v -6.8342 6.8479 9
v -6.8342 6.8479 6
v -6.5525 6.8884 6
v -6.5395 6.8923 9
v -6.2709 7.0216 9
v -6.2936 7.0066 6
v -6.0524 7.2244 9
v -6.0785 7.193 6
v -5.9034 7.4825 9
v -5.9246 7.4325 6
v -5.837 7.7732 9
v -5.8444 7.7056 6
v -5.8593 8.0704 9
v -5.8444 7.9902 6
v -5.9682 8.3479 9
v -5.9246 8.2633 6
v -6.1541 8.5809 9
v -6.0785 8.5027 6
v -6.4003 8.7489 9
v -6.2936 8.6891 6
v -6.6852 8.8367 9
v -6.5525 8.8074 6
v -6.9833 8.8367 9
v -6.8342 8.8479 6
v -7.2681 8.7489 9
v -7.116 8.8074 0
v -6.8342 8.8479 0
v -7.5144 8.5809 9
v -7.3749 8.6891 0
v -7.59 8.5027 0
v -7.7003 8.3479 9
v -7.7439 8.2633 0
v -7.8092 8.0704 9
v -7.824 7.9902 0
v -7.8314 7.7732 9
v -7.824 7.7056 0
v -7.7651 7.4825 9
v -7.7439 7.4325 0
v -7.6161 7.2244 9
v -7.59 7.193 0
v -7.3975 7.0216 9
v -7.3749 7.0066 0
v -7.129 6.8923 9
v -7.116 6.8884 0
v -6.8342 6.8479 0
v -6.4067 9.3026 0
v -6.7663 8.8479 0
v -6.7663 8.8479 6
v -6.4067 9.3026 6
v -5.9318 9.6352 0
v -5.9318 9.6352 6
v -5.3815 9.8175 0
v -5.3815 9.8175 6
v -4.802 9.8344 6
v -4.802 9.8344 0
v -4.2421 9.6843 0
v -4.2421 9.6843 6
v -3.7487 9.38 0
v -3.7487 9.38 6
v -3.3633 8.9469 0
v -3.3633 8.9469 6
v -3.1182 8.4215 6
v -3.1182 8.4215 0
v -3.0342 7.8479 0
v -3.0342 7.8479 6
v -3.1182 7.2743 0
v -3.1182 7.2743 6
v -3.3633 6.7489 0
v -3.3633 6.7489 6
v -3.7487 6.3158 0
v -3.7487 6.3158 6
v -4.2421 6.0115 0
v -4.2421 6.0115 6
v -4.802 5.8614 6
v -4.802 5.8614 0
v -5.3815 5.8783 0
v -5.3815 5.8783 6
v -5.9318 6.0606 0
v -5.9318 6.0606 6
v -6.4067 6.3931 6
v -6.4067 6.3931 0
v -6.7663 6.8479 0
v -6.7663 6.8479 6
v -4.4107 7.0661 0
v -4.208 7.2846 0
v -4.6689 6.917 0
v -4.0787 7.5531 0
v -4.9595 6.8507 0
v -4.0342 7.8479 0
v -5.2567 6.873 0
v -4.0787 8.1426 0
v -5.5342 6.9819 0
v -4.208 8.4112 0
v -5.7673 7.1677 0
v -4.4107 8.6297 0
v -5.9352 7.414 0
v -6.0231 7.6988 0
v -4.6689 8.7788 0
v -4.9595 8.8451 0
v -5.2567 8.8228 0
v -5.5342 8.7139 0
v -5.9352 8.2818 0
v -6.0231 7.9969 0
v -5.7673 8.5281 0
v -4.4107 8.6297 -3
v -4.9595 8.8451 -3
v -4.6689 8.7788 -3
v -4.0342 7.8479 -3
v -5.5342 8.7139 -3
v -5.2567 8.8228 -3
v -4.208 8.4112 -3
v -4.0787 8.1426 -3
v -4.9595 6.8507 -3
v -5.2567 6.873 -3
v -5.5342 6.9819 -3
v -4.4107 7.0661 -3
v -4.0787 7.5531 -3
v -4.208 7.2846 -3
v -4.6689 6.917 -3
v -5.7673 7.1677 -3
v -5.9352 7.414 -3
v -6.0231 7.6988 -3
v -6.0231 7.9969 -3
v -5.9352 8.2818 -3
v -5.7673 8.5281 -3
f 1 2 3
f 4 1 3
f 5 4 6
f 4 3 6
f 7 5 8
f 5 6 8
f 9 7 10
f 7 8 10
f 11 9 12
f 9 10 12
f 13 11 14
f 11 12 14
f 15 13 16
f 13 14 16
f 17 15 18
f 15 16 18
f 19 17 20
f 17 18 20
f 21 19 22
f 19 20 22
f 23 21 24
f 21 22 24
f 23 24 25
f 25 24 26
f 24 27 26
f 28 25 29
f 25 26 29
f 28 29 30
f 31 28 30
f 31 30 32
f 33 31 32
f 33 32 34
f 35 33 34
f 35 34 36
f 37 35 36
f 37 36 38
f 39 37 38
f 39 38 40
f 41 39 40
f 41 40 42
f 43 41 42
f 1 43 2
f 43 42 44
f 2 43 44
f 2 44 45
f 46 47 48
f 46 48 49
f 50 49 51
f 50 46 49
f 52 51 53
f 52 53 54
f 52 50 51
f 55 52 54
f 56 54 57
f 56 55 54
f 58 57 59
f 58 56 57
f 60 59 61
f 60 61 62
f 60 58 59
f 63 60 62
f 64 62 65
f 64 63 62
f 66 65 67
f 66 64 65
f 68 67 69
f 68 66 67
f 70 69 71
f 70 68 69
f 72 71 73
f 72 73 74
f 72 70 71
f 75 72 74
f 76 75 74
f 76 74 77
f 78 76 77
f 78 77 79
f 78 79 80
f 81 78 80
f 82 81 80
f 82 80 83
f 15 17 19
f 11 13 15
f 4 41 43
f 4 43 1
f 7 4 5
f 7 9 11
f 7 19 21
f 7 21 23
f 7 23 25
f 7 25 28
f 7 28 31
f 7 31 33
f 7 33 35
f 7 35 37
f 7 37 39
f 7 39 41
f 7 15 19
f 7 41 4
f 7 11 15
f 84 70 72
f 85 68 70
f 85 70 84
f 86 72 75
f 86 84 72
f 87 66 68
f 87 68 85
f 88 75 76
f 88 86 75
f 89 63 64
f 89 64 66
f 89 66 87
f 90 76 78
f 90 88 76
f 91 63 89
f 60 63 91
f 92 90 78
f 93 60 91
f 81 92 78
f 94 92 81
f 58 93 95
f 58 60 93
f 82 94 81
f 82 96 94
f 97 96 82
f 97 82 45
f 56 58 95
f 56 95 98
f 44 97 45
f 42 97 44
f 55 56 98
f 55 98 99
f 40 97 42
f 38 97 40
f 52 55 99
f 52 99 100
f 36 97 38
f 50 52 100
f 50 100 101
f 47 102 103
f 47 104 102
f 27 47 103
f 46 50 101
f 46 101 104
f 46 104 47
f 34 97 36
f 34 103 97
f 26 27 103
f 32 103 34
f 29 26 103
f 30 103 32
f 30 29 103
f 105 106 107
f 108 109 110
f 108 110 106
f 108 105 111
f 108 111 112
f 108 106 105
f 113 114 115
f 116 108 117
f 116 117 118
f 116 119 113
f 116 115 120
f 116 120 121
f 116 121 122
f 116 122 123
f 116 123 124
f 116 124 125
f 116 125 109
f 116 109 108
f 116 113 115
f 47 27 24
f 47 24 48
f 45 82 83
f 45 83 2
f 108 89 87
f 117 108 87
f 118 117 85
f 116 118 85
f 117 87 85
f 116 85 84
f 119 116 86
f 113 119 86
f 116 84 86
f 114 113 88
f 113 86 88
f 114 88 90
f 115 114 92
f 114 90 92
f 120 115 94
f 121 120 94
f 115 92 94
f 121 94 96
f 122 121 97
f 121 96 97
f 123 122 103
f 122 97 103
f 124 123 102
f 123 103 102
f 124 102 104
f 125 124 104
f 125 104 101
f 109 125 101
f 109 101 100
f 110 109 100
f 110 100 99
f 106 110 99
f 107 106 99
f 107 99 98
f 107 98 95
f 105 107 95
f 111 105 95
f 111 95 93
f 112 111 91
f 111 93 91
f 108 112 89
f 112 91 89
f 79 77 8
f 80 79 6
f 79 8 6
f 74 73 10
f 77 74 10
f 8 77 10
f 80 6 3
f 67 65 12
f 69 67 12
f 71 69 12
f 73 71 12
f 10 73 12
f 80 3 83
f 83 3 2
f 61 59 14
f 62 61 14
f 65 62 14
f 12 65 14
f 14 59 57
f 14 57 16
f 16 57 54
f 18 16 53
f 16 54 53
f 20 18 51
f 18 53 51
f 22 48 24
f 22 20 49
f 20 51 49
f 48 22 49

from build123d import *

# Parameters (mm, degrees)
BOSS_EXTRUDE1_DEPTH = 6
SKETCH2_R           = 1
BOSS_EXTRUDE2_DEPTH = 3
SKETCH3_R           = 1
BOSS_EXTRUDE3_DEPTH = 3


with BuildPart() as part:
    # Sketch1 → Boss-Extrude1 (new body)
    with BuildSketch(Plane.XY):
        with BuildLine():
            Line((-6.834228044, 8.847888353), (-6.766278852, 8.847888353))
            ThreePointArc((-6.766278852, 8.847888353), (-3.034228044, 7.847888353), (-6.766278852, 6.847888353))
            Line((-6.766278852, 6.847888353), (-6.834228044, 6.847888353))
            ThreePointArc((-6.834228044, 6.847888353), (-7.834228044, 7.847888353), (-6.834228044, 8.847888353))
        make_face()
    extrude(amount=BOSS_EXTRUDE1_DEPTH)

    # Sketch2 → Boss-Extrude2 (add)
    with BuildSketch(Plane.XY.offset(6)):
        with Locations(Location((-6.834228044, 7.847888353, 0), (0, 0, 270))):
            Circle(SKETCH2_R)
    extrude(amount=BOSS_EXTRUDE2_DEPTH)

    # Sketch3 → Boss-Extrude3 (add)
    with BuildSketch(Plane(origin=(0, 0, 0), x_dir=(-1, 0, 0), z_dir=(0, 0, -1))):
        with Locations(Location((5.034228044, 7.847888353, 0), (0, 0, 180))):
            Circle(SKETCH3_R)
    extrude(amount=BOSS_EXTRUDE3_DEPTH)


solid = part.part
